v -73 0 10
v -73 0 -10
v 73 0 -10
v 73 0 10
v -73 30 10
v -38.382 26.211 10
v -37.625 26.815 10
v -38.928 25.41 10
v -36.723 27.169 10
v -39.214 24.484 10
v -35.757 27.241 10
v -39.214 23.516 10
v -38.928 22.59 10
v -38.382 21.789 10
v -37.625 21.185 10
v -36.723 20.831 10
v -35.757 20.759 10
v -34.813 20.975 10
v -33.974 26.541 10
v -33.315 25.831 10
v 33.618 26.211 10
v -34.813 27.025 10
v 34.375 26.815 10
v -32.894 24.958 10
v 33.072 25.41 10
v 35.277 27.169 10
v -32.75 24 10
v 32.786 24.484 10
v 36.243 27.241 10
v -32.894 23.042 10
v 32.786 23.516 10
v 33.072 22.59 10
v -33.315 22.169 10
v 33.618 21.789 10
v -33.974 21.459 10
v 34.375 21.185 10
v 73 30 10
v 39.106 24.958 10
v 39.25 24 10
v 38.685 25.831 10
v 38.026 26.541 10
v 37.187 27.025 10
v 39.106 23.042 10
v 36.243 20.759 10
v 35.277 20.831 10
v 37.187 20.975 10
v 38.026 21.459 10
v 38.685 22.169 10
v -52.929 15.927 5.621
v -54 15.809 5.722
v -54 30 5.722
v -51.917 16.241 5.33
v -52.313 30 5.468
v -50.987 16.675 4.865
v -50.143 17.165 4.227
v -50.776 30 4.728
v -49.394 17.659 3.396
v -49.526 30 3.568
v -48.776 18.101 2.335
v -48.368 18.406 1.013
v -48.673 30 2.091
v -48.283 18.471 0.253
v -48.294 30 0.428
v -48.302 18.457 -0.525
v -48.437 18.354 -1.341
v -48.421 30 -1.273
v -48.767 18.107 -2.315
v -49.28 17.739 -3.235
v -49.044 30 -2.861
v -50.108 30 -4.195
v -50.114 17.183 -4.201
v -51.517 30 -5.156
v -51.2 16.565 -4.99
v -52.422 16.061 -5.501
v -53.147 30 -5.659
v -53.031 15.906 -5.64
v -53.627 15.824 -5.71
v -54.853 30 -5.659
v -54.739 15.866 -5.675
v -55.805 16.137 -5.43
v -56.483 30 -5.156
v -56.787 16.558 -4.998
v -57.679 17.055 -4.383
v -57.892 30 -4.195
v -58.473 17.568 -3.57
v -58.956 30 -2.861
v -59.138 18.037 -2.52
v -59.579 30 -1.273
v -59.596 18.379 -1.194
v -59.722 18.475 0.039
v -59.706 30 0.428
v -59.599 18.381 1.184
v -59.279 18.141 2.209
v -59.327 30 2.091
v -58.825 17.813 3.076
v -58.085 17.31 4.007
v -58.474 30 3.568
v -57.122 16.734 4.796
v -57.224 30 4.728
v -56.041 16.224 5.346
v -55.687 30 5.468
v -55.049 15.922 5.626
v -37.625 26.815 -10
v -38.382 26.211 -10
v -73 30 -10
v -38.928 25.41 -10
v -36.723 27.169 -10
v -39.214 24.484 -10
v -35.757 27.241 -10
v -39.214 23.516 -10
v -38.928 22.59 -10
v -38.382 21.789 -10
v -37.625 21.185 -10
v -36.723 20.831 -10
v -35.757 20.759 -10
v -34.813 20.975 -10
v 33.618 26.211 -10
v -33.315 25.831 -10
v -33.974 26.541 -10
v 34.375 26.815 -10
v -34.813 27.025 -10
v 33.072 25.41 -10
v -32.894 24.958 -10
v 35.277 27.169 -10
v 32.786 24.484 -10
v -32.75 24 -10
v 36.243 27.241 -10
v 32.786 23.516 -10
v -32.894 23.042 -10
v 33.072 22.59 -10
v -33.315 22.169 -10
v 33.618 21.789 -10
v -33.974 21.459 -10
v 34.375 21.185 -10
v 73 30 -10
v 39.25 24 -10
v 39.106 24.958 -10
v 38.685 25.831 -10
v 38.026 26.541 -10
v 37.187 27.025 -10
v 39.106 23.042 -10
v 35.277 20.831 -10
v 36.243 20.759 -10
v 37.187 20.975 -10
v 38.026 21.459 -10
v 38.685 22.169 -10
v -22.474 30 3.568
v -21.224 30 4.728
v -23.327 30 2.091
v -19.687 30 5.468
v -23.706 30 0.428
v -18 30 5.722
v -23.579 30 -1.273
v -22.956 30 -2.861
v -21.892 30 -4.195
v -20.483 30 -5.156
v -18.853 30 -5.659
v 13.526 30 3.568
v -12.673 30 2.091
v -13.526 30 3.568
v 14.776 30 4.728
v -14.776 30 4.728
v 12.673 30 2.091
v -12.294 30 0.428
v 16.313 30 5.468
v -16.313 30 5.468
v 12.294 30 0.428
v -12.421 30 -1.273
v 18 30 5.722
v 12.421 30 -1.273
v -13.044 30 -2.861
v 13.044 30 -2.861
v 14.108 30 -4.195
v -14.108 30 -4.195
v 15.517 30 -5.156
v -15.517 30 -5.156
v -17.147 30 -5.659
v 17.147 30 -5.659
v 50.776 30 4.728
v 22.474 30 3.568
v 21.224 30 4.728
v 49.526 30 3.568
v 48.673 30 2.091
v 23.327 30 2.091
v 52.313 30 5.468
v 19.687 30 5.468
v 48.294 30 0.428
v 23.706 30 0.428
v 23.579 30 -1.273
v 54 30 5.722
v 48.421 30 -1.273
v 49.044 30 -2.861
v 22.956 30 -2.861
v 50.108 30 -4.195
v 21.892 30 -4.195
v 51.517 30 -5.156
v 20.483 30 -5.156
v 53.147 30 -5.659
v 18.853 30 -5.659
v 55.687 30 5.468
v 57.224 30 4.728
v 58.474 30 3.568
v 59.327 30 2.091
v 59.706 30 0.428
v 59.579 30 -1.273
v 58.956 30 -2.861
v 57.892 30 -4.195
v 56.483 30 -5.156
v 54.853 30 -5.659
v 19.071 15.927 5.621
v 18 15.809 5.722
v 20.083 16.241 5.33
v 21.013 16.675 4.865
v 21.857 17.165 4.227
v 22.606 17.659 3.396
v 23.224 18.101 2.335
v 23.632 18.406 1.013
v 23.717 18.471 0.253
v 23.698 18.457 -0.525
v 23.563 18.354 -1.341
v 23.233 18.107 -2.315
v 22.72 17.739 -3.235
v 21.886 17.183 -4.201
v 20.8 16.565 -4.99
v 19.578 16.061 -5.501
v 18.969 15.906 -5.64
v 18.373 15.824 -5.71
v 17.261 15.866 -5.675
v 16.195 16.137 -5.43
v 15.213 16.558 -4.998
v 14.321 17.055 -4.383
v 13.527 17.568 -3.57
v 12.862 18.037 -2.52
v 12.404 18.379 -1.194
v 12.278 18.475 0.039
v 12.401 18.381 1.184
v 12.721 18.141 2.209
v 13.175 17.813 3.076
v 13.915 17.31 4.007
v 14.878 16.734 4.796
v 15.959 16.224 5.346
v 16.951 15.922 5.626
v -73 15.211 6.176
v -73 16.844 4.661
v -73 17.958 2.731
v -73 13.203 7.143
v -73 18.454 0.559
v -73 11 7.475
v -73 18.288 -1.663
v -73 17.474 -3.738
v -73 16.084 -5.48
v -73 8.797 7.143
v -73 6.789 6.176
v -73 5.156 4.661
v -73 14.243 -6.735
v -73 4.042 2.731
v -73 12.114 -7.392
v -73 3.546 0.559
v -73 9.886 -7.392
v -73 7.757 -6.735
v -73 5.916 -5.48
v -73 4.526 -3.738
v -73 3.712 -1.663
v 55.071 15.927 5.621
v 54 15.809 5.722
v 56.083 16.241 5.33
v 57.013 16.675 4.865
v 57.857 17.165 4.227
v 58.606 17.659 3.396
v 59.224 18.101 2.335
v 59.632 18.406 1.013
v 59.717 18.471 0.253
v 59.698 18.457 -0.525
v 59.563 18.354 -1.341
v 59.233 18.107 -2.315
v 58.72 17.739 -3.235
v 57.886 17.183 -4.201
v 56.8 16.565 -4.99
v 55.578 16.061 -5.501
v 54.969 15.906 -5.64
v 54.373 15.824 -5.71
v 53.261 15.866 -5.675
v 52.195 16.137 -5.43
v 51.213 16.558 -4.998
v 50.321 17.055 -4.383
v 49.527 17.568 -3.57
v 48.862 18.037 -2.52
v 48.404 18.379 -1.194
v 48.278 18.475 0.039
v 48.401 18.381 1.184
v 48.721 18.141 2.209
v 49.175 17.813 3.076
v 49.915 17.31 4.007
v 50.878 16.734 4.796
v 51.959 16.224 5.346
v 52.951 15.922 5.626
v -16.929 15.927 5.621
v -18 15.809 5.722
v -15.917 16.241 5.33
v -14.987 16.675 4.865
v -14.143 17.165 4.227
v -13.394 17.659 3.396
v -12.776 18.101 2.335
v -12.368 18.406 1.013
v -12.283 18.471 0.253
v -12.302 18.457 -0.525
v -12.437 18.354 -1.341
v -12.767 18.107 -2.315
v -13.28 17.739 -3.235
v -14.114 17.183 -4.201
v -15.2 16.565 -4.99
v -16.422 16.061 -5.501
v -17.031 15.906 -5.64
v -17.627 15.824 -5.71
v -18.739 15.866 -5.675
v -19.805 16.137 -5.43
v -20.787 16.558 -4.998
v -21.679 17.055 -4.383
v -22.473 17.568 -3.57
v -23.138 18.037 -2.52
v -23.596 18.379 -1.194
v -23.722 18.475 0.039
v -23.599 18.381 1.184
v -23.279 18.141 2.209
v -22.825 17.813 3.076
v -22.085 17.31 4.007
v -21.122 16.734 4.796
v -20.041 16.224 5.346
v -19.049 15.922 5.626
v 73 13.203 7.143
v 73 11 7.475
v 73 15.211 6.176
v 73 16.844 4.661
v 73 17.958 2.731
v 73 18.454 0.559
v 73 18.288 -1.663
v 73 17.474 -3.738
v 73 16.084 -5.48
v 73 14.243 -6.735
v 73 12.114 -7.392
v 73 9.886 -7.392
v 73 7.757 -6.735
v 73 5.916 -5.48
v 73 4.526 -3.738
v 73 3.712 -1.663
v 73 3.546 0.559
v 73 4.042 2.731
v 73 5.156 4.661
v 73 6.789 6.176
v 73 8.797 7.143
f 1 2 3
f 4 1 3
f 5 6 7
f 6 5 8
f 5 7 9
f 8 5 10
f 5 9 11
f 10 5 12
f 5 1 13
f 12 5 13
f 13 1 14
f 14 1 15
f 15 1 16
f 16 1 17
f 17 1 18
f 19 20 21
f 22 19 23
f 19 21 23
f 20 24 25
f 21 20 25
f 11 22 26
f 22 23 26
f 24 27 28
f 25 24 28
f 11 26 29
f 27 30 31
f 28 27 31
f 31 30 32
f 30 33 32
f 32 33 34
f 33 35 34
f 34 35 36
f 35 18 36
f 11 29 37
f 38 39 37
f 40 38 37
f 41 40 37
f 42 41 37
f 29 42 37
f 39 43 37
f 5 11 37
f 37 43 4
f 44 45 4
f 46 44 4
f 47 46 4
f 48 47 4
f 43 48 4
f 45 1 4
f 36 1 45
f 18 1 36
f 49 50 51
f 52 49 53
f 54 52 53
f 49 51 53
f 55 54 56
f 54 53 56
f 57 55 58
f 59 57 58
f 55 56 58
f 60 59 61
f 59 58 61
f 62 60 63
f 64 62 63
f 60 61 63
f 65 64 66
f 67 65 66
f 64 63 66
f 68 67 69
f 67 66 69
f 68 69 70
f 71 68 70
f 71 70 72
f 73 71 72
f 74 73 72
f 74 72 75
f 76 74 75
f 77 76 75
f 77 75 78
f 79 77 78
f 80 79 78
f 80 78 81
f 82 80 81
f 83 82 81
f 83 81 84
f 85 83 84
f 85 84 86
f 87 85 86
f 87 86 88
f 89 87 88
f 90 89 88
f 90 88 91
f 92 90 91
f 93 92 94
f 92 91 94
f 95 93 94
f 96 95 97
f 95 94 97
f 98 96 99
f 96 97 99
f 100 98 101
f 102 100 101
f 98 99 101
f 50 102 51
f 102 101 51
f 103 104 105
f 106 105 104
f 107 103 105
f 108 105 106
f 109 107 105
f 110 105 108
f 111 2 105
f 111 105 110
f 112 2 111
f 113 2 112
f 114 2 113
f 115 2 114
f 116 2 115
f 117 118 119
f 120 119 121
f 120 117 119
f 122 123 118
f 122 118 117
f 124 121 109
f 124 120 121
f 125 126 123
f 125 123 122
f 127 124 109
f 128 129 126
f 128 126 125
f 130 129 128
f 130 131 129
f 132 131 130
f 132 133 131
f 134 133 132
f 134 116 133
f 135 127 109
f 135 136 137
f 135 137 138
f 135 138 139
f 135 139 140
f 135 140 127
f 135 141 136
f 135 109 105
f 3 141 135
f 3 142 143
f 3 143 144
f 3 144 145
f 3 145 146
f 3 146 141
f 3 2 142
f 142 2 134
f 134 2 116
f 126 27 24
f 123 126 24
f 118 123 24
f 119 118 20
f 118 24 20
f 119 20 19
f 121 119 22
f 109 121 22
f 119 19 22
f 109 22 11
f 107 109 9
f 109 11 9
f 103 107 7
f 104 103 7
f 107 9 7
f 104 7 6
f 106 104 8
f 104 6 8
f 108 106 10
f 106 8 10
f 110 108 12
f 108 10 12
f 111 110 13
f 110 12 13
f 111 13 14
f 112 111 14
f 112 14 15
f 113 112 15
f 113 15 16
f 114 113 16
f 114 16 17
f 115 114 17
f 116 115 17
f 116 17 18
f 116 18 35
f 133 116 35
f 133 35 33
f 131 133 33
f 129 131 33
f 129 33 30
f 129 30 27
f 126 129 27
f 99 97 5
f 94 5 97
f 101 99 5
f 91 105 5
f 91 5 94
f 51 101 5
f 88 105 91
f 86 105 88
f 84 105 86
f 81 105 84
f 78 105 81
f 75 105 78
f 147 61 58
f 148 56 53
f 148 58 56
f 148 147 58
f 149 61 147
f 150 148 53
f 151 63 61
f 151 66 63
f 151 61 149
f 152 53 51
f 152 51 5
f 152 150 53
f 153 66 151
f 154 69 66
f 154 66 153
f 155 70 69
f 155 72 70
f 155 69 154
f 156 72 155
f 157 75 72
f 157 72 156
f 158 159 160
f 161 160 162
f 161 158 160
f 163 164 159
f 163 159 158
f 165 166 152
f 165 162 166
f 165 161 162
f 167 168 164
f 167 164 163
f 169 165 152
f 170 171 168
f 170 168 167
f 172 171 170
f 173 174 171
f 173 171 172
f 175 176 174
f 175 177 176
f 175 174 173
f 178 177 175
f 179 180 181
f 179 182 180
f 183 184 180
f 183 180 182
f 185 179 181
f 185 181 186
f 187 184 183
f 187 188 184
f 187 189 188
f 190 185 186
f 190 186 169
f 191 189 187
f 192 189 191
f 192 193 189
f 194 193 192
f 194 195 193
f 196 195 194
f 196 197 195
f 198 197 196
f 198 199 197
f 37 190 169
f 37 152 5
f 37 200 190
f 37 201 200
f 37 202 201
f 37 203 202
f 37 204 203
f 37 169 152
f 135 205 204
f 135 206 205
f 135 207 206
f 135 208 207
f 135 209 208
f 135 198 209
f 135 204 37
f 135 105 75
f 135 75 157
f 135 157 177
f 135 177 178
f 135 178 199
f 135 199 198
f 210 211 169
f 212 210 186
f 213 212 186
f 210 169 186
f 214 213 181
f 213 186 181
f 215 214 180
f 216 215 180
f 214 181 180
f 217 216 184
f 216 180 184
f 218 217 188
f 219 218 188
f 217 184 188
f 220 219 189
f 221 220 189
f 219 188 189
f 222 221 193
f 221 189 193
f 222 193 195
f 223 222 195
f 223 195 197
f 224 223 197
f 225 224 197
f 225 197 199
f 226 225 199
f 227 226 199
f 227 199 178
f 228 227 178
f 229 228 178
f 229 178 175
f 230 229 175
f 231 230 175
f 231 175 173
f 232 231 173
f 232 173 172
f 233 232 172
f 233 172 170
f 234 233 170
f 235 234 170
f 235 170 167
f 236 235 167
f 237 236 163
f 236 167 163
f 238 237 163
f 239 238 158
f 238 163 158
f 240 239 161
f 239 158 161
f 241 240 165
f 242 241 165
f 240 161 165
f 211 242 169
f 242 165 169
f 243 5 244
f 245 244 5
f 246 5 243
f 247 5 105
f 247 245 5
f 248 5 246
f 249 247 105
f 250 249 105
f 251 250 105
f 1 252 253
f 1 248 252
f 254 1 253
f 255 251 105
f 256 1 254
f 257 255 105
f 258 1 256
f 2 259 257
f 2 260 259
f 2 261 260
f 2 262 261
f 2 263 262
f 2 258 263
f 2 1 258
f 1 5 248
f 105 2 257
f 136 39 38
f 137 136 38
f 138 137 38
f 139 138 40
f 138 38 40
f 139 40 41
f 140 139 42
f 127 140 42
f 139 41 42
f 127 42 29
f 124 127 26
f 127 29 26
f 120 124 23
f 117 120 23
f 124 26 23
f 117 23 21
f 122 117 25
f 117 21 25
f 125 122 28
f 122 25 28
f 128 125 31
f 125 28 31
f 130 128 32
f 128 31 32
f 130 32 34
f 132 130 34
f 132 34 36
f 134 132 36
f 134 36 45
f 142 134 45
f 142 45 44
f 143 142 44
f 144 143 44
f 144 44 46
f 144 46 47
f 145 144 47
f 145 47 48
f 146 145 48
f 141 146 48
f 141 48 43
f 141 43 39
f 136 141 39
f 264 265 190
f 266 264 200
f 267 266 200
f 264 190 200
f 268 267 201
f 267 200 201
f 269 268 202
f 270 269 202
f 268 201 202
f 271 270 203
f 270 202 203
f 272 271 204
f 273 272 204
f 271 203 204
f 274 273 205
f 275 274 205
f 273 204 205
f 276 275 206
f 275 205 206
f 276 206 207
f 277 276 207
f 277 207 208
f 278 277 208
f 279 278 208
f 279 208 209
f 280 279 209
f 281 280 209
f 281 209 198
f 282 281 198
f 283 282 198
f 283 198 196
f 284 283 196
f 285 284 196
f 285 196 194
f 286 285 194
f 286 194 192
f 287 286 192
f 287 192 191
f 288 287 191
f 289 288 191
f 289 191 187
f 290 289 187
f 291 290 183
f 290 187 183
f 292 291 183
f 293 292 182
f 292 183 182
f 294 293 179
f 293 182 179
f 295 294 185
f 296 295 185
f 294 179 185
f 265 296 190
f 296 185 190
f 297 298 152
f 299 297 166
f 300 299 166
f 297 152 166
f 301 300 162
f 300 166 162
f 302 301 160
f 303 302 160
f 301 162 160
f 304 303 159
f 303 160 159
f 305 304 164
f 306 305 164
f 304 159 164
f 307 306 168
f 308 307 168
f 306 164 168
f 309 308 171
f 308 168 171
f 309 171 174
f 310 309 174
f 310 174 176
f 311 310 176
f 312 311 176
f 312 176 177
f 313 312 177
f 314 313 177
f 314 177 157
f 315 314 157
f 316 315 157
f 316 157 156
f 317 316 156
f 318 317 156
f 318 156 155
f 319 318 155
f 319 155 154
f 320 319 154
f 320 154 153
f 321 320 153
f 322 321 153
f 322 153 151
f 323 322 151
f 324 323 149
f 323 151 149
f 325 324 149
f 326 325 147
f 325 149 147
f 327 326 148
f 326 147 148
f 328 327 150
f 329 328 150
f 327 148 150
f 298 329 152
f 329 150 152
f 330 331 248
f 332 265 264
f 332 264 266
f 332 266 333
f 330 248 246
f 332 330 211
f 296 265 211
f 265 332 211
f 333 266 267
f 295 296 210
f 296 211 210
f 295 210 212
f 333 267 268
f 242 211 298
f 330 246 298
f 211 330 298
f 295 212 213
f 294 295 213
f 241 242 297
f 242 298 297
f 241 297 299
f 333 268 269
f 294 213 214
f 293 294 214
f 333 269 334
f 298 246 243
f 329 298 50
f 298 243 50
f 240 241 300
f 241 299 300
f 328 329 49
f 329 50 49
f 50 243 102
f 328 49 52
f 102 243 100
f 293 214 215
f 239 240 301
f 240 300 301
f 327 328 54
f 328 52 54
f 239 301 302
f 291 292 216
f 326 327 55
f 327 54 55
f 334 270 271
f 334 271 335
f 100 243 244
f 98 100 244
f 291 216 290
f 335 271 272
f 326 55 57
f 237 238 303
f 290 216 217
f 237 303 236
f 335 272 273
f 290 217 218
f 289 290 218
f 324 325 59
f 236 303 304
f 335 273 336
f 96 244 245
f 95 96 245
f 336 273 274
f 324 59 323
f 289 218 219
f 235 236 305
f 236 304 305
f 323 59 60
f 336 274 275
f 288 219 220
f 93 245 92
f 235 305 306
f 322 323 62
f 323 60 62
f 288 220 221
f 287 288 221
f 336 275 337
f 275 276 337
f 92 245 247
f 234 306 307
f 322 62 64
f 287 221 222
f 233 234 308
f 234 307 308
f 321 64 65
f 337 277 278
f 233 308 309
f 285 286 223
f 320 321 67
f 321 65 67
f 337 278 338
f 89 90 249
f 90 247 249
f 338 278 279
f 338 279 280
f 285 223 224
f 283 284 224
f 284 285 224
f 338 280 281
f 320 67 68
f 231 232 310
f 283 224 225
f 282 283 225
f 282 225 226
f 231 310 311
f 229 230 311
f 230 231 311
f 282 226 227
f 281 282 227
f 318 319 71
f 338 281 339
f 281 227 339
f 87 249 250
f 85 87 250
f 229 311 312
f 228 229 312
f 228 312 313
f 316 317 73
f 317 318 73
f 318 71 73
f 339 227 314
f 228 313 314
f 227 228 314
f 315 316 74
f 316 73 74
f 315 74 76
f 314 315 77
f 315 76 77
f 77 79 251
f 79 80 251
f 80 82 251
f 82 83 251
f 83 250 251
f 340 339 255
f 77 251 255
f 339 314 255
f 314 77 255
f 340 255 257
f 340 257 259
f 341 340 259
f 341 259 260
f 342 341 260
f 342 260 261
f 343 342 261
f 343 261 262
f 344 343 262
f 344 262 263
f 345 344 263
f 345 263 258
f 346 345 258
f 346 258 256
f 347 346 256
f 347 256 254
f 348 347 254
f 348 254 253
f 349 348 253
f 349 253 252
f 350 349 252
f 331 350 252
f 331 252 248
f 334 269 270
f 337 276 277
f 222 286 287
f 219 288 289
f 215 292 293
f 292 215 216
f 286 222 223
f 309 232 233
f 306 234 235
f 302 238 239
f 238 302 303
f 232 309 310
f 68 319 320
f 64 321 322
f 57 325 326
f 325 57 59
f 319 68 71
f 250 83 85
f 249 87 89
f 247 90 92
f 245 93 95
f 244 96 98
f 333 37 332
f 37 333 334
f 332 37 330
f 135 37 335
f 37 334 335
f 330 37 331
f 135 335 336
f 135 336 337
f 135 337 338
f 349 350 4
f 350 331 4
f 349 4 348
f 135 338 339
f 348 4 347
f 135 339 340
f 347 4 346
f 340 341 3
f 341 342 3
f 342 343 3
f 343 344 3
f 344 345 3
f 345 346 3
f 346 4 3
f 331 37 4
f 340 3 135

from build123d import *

# Parameters (mm, degrees)
SKETCH1_W           = 146
SKETCH1_H           = 20
BOSS_EXTRUDE1_DEPTH = 30
SKETCH2_R           = 3.25
CUT_EXTRUDE1_DEPTH  = 30
SKETCH3_R           = 7.475
CUT_EXTRUDE2_DEPTH  = 150.385407587
SKETCH4_R           = 5.7225
CUT_EXTRUDE3_DEPTH  = 15


with BuildPart() as part:
    # Sketch1 → Boss-Extrude1 (new body)
    with BuildSketch(Plane(origin=(0, 0, 0), x_dir=(1, 0, 0), z_dir=(0, 1, 0))):
        Rectangle(SKETCH1_W, SKETCH1_H)
    extrude(amount=BOSS_EXTRUDE1_DEPTH)

    # Sketch2 → Cut-Extrude1 (cut)
    with BuildSketch(Plane.XY.offset(10)):
        with Locations((-36, 24)):
            Circle(SKETCH2_R)
        with Locations((36, 24)):
            Circle(SKETCH2_R)
    extrude(amount=-CUT_EXTRUDE1_DEPTH, mode=Mode.SUBTRACT)

    # Sketch3 → Cut-Extrude2 (cut, through all)
    with BuildSketch(Plane.ZY.offset(73)):
        with Locations((0, 11)):
            Circle(SKETCH3_R)
    extrude(amount=-CUT_EXTRUDE2_DEPTH, mode=Mode.SUBTRACT)

    # Sketch4 → Cut-Extrude3 (cut)
    with BuildSketch(Plane(origin=(0, 30, 0), x_dir=(1, 0, 0), z_dir=(0, 1, 0))):
        with Locations(Location((-54, 0, 0), (0, 0, 270))):
            Circle(SKETCH4_R)
        with Locations(Location((-18, 0, 0), (0, 0, 270))):
            Circle(SKETCH4_R)
        with Locations(Location((18, 0, 0), (0, 0, 270))):
            Circle(SKETCH4_R)
        with Locations(Location((54, 0, 0), (0, 0, 270))):
            Circle(SKETCH4_R)
    extrude(amount=-CUT_EXTRUDE3_DEPTH, mode=Mode.SUBTRACT)


solid = part.part
